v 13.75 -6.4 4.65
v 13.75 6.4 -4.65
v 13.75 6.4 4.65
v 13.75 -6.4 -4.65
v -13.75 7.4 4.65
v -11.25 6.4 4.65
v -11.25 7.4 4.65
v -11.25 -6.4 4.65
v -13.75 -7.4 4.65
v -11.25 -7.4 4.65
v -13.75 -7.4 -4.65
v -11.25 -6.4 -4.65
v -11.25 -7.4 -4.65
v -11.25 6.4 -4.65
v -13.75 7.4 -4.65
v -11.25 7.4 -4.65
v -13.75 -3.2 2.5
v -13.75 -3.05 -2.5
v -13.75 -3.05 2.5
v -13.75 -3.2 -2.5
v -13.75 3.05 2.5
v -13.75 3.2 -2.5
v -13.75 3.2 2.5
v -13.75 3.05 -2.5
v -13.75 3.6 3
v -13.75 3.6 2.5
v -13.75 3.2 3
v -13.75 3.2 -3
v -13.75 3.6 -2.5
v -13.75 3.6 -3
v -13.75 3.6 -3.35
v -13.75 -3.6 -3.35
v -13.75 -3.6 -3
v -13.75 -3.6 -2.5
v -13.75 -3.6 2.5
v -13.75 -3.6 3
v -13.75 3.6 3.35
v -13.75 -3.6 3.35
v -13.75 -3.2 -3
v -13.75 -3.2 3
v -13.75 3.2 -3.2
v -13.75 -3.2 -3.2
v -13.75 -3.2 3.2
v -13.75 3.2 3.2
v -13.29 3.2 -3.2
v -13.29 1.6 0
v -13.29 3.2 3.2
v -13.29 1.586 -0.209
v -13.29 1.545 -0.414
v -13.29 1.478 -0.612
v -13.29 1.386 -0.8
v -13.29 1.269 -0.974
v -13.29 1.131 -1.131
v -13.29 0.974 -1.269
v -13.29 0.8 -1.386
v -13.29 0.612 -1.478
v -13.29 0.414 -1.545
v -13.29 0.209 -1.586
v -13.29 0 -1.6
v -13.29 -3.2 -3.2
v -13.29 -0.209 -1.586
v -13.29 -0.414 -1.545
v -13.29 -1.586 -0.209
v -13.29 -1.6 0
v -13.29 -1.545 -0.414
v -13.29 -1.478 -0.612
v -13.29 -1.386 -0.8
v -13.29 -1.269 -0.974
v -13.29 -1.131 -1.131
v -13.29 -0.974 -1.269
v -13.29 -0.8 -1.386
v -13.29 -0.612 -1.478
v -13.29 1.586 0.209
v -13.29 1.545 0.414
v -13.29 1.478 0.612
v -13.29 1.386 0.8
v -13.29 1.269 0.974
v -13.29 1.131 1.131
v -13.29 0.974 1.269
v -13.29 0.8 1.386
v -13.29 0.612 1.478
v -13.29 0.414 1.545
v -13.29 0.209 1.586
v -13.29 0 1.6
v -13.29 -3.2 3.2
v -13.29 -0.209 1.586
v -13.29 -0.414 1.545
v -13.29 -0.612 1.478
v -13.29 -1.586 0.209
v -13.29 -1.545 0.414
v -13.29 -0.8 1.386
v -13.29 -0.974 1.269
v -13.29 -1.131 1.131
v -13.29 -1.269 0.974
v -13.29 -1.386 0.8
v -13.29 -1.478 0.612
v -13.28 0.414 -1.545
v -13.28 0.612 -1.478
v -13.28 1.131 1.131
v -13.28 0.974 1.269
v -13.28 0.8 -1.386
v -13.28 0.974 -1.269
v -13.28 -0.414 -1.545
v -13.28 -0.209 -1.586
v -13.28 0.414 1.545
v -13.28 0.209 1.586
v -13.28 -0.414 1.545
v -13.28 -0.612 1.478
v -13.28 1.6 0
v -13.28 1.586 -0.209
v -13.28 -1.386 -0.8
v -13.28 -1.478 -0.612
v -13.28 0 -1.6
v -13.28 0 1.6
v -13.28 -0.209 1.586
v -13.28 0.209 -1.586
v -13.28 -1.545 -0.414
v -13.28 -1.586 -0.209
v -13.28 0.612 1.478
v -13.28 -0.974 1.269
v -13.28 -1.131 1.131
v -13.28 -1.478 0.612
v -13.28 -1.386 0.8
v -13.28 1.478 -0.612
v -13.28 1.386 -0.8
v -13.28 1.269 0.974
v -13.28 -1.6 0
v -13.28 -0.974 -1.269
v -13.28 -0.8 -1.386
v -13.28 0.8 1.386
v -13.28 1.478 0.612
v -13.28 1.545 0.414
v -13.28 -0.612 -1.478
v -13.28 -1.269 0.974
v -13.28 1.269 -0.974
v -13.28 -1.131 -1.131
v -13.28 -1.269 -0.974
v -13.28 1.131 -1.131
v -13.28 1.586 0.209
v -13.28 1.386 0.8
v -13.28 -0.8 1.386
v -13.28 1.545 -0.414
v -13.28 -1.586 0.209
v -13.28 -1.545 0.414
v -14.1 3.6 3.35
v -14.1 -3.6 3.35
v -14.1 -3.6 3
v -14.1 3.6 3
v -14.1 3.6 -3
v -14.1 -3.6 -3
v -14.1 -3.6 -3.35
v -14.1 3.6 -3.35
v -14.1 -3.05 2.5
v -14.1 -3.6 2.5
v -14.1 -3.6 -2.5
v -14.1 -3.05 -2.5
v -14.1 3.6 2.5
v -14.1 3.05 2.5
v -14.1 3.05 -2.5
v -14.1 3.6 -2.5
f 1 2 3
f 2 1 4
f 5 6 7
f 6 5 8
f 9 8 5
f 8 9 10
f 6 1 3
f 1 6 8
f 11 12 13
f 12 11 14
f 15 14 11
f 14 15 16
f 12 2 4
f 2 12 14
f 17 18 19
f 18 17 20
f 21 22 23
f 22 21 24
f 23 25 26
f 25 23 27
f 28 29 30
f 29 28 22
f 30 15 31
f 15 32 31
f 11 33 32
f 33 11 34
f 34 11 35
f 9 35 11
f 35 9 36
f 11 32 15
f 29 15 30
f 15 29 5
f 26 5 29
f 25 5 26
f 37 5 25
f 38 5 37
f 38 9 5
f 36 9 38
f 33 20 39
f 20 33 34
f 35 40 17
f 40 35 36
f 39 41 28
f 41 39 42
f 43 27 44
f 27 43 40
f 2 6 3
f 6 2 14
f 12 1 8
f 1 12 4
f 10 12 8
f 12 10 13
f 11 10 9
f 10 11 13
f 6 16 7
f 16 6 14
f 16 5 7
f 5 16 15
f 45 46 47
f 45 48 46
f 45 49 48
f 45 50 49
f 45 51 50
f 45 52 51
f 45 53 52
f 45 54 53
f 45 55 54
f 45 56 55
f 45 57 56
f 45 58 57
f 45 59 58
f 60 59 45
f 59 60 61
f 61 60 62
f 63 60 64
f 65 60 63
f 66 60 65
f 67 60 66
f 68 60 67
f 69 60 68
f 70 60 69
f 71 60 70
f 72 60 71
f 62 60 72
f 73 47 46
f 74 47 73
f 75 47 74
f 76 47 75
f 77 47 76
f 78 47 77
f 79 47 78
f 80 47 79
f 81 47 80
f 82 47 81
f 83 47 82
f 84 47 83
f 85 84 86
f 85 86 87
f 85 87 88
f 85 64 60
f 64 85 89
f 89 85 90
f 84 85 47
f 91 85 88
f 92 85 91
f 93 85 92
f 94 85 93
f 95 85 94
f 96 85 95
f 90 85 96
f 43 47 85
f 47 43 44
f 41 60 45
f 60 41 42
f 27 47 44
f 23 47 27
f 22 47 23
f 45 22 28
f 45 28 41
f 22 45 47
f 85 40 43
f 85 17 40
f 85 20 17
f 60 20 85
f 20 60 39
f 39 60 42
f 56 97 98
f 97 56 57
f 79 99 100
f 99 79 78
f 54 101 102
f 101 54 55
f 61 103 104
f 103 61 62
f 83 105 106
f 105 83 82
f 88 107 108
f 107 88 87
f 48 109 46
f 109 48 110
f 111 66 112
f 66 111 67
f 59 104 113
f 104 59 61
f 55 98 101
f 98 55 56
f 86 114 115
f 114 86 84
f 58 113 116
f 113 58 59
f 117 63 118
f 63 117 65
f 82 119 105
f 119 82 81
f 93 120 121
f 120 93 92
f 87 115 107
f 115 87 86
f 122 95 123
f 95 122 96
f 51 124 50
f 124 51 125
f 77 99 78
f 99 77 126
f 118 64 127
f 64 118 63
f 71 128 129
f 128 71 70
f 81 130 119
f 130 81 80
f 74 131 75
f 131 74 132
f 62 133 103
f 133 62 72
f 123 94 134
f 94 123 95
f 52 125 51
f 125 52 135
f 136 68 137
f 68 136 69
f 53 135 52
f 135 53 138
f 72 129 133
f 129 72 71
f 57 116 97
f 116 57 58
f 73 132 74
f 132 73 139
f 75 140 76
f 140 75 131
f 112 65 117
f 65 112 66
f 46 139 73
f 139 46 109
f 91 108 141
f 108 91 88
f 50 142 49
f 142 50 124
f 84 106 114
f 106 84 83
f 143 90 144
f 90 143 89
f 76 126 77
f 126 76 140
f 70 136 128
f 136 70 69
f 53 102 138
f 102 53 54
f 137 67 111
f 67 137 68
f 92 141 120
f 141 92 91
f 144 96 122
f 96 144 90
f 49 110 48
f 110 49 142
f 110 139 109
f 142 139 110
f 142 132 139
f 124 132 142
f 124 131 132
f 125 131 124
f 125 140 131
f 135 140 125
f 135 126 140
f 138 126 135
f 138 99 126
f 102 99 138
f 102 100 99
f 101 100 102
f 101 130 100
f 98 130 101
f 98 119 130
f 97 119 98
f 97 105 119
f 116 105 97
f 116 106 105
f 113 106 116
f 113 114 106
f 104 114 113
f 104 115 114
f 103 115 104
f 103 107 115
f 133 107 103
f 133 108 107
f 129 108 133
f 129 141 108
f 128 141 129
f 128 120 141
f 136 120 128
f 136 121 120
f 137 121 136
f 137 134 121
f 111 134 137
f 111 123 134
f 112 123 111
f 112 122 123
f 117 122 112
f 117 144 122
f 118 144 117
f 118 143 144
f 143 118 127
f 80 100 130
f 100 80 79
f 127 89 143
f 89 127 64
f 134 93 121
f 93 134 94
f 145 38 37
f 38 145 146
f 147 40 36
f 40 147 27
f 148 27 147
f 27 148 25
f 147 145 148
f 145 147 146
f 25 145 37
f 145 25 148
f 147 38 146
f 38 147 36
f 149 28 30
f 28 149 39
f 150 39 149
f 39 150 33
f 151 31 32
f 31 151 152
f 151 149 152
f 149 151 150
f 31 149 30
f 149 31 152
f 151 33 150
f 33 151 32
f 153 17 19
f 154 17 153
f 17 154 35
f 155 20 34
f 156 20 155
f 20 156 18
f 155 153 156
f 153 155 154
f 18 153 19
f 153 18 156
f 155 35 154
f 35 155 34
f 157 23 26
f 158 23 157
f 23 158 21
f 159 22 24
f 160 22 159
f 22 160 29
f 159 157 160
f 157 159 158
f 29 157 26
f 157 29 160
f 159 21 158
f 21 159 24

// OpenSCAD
/*
    SC Fiber Connector Adapter Mock
    Based on corrected drawing.

    Orientation:
    X = length/front-to-back
    Y = width/side-to-side
    Z = height/top-bottom

    Main body:
    L = 27.5 mm
    W = 12.8 mm
    H = 9.3 mm

    Side flange:
    Overall width across side flanges = 14.8 mm
    Main body width = 12.8 mm
    Each side flange protrudes = (14.8 - 12.8) / 2 = 1.0 mm

    Flange thickness along length = 2.5 mm
    Flanges are side-only, not top/bottom.
*/

$fn = 48;

// --------------------
// Main dimensions
// --------------------
sc_l = 27.5;
sc_w = 12.8;
sc_h = 9.3;

flange_total_w = 14.8;
flange_t = 2.5;

side_flange_each = (flange_total_w - sc_w) / 2;

// Visual front detail settings
front_detail_depth = 0.45;
front_opening_d = 3.2;
front_inner_square = 6.4;

// --------------------
// SC adapter mock
// --------------------
module sc_connector_mock(
    show_front_detail = true,
    center = true
) {
    translate(center ? [-sc_l/2, -sc_w/2, -sc_h/2] : [0, 0, 0]) {

        difference() {
            union() {
                // Main rectangular body
                cube([sc_l, sc_w, sc_h]);

                // Left side flange only
                translate([0, -side_flange_each, 0])
                    cube([flange_t, side_flange_each, sc_h]);

                // Right side flange only
                translate([0, sc_w, 0])
                    cube([flange_t, side_flange_each, sc_h]);
            }

            if (show_front_detail) {
                // Shallow front square recess, centered on face
                translate([-0.01, (sc_w - front_inner_square) / 2, (sc_h - front_inner_square) / 2])
                    cube([front_detail_depth + 0.02, front_inner_square, front_inner_square]);

                // Center round connector hole visual
                translate([-0.02, sc_w / 2, sc_h / 2])
                    rotate([0, 90, 0])
                        cylinder(d = front_opening_d, h = front_detail_depth + 0.04);
            }
        }

        if (show_front_detail) {
            // Raised/remaining visual ridges on front face
            front_ridge_w = 0.55;
            front_ridge_h = 0.35;
            ridge_depth = 0.35;

            // Top/bottom horizontal ridges
            translate([-ridge_depth, (sc_w - 7.2) / 2, sc_h / 2 + 3.0])
                cube([ridge_depth, 7.2, front_ridge_h]);

            translate([-ridge_depth, (sc_w - 7.2) / 2, sc_h / 2 - 3.35])
                cube([ridge_depth, 7.2, front_ridge_h]);

            // Side vertical ridges
            translate([-ridge_depth, sc_w / 2 - 3.6, sc_h / 2 - 2.5])
                cube([ridge_depth, front_ridge_w, 5.0]);

            translate([-ridge_depth, sc_w / 2 + 3.05, sc_h / 2 - 2.5])
                cube([ridge_depth, front_ridge_w, 5.0]);
        }
    }
}

// --------------------
// Preview
// --------------------
sc_connector_mock();
